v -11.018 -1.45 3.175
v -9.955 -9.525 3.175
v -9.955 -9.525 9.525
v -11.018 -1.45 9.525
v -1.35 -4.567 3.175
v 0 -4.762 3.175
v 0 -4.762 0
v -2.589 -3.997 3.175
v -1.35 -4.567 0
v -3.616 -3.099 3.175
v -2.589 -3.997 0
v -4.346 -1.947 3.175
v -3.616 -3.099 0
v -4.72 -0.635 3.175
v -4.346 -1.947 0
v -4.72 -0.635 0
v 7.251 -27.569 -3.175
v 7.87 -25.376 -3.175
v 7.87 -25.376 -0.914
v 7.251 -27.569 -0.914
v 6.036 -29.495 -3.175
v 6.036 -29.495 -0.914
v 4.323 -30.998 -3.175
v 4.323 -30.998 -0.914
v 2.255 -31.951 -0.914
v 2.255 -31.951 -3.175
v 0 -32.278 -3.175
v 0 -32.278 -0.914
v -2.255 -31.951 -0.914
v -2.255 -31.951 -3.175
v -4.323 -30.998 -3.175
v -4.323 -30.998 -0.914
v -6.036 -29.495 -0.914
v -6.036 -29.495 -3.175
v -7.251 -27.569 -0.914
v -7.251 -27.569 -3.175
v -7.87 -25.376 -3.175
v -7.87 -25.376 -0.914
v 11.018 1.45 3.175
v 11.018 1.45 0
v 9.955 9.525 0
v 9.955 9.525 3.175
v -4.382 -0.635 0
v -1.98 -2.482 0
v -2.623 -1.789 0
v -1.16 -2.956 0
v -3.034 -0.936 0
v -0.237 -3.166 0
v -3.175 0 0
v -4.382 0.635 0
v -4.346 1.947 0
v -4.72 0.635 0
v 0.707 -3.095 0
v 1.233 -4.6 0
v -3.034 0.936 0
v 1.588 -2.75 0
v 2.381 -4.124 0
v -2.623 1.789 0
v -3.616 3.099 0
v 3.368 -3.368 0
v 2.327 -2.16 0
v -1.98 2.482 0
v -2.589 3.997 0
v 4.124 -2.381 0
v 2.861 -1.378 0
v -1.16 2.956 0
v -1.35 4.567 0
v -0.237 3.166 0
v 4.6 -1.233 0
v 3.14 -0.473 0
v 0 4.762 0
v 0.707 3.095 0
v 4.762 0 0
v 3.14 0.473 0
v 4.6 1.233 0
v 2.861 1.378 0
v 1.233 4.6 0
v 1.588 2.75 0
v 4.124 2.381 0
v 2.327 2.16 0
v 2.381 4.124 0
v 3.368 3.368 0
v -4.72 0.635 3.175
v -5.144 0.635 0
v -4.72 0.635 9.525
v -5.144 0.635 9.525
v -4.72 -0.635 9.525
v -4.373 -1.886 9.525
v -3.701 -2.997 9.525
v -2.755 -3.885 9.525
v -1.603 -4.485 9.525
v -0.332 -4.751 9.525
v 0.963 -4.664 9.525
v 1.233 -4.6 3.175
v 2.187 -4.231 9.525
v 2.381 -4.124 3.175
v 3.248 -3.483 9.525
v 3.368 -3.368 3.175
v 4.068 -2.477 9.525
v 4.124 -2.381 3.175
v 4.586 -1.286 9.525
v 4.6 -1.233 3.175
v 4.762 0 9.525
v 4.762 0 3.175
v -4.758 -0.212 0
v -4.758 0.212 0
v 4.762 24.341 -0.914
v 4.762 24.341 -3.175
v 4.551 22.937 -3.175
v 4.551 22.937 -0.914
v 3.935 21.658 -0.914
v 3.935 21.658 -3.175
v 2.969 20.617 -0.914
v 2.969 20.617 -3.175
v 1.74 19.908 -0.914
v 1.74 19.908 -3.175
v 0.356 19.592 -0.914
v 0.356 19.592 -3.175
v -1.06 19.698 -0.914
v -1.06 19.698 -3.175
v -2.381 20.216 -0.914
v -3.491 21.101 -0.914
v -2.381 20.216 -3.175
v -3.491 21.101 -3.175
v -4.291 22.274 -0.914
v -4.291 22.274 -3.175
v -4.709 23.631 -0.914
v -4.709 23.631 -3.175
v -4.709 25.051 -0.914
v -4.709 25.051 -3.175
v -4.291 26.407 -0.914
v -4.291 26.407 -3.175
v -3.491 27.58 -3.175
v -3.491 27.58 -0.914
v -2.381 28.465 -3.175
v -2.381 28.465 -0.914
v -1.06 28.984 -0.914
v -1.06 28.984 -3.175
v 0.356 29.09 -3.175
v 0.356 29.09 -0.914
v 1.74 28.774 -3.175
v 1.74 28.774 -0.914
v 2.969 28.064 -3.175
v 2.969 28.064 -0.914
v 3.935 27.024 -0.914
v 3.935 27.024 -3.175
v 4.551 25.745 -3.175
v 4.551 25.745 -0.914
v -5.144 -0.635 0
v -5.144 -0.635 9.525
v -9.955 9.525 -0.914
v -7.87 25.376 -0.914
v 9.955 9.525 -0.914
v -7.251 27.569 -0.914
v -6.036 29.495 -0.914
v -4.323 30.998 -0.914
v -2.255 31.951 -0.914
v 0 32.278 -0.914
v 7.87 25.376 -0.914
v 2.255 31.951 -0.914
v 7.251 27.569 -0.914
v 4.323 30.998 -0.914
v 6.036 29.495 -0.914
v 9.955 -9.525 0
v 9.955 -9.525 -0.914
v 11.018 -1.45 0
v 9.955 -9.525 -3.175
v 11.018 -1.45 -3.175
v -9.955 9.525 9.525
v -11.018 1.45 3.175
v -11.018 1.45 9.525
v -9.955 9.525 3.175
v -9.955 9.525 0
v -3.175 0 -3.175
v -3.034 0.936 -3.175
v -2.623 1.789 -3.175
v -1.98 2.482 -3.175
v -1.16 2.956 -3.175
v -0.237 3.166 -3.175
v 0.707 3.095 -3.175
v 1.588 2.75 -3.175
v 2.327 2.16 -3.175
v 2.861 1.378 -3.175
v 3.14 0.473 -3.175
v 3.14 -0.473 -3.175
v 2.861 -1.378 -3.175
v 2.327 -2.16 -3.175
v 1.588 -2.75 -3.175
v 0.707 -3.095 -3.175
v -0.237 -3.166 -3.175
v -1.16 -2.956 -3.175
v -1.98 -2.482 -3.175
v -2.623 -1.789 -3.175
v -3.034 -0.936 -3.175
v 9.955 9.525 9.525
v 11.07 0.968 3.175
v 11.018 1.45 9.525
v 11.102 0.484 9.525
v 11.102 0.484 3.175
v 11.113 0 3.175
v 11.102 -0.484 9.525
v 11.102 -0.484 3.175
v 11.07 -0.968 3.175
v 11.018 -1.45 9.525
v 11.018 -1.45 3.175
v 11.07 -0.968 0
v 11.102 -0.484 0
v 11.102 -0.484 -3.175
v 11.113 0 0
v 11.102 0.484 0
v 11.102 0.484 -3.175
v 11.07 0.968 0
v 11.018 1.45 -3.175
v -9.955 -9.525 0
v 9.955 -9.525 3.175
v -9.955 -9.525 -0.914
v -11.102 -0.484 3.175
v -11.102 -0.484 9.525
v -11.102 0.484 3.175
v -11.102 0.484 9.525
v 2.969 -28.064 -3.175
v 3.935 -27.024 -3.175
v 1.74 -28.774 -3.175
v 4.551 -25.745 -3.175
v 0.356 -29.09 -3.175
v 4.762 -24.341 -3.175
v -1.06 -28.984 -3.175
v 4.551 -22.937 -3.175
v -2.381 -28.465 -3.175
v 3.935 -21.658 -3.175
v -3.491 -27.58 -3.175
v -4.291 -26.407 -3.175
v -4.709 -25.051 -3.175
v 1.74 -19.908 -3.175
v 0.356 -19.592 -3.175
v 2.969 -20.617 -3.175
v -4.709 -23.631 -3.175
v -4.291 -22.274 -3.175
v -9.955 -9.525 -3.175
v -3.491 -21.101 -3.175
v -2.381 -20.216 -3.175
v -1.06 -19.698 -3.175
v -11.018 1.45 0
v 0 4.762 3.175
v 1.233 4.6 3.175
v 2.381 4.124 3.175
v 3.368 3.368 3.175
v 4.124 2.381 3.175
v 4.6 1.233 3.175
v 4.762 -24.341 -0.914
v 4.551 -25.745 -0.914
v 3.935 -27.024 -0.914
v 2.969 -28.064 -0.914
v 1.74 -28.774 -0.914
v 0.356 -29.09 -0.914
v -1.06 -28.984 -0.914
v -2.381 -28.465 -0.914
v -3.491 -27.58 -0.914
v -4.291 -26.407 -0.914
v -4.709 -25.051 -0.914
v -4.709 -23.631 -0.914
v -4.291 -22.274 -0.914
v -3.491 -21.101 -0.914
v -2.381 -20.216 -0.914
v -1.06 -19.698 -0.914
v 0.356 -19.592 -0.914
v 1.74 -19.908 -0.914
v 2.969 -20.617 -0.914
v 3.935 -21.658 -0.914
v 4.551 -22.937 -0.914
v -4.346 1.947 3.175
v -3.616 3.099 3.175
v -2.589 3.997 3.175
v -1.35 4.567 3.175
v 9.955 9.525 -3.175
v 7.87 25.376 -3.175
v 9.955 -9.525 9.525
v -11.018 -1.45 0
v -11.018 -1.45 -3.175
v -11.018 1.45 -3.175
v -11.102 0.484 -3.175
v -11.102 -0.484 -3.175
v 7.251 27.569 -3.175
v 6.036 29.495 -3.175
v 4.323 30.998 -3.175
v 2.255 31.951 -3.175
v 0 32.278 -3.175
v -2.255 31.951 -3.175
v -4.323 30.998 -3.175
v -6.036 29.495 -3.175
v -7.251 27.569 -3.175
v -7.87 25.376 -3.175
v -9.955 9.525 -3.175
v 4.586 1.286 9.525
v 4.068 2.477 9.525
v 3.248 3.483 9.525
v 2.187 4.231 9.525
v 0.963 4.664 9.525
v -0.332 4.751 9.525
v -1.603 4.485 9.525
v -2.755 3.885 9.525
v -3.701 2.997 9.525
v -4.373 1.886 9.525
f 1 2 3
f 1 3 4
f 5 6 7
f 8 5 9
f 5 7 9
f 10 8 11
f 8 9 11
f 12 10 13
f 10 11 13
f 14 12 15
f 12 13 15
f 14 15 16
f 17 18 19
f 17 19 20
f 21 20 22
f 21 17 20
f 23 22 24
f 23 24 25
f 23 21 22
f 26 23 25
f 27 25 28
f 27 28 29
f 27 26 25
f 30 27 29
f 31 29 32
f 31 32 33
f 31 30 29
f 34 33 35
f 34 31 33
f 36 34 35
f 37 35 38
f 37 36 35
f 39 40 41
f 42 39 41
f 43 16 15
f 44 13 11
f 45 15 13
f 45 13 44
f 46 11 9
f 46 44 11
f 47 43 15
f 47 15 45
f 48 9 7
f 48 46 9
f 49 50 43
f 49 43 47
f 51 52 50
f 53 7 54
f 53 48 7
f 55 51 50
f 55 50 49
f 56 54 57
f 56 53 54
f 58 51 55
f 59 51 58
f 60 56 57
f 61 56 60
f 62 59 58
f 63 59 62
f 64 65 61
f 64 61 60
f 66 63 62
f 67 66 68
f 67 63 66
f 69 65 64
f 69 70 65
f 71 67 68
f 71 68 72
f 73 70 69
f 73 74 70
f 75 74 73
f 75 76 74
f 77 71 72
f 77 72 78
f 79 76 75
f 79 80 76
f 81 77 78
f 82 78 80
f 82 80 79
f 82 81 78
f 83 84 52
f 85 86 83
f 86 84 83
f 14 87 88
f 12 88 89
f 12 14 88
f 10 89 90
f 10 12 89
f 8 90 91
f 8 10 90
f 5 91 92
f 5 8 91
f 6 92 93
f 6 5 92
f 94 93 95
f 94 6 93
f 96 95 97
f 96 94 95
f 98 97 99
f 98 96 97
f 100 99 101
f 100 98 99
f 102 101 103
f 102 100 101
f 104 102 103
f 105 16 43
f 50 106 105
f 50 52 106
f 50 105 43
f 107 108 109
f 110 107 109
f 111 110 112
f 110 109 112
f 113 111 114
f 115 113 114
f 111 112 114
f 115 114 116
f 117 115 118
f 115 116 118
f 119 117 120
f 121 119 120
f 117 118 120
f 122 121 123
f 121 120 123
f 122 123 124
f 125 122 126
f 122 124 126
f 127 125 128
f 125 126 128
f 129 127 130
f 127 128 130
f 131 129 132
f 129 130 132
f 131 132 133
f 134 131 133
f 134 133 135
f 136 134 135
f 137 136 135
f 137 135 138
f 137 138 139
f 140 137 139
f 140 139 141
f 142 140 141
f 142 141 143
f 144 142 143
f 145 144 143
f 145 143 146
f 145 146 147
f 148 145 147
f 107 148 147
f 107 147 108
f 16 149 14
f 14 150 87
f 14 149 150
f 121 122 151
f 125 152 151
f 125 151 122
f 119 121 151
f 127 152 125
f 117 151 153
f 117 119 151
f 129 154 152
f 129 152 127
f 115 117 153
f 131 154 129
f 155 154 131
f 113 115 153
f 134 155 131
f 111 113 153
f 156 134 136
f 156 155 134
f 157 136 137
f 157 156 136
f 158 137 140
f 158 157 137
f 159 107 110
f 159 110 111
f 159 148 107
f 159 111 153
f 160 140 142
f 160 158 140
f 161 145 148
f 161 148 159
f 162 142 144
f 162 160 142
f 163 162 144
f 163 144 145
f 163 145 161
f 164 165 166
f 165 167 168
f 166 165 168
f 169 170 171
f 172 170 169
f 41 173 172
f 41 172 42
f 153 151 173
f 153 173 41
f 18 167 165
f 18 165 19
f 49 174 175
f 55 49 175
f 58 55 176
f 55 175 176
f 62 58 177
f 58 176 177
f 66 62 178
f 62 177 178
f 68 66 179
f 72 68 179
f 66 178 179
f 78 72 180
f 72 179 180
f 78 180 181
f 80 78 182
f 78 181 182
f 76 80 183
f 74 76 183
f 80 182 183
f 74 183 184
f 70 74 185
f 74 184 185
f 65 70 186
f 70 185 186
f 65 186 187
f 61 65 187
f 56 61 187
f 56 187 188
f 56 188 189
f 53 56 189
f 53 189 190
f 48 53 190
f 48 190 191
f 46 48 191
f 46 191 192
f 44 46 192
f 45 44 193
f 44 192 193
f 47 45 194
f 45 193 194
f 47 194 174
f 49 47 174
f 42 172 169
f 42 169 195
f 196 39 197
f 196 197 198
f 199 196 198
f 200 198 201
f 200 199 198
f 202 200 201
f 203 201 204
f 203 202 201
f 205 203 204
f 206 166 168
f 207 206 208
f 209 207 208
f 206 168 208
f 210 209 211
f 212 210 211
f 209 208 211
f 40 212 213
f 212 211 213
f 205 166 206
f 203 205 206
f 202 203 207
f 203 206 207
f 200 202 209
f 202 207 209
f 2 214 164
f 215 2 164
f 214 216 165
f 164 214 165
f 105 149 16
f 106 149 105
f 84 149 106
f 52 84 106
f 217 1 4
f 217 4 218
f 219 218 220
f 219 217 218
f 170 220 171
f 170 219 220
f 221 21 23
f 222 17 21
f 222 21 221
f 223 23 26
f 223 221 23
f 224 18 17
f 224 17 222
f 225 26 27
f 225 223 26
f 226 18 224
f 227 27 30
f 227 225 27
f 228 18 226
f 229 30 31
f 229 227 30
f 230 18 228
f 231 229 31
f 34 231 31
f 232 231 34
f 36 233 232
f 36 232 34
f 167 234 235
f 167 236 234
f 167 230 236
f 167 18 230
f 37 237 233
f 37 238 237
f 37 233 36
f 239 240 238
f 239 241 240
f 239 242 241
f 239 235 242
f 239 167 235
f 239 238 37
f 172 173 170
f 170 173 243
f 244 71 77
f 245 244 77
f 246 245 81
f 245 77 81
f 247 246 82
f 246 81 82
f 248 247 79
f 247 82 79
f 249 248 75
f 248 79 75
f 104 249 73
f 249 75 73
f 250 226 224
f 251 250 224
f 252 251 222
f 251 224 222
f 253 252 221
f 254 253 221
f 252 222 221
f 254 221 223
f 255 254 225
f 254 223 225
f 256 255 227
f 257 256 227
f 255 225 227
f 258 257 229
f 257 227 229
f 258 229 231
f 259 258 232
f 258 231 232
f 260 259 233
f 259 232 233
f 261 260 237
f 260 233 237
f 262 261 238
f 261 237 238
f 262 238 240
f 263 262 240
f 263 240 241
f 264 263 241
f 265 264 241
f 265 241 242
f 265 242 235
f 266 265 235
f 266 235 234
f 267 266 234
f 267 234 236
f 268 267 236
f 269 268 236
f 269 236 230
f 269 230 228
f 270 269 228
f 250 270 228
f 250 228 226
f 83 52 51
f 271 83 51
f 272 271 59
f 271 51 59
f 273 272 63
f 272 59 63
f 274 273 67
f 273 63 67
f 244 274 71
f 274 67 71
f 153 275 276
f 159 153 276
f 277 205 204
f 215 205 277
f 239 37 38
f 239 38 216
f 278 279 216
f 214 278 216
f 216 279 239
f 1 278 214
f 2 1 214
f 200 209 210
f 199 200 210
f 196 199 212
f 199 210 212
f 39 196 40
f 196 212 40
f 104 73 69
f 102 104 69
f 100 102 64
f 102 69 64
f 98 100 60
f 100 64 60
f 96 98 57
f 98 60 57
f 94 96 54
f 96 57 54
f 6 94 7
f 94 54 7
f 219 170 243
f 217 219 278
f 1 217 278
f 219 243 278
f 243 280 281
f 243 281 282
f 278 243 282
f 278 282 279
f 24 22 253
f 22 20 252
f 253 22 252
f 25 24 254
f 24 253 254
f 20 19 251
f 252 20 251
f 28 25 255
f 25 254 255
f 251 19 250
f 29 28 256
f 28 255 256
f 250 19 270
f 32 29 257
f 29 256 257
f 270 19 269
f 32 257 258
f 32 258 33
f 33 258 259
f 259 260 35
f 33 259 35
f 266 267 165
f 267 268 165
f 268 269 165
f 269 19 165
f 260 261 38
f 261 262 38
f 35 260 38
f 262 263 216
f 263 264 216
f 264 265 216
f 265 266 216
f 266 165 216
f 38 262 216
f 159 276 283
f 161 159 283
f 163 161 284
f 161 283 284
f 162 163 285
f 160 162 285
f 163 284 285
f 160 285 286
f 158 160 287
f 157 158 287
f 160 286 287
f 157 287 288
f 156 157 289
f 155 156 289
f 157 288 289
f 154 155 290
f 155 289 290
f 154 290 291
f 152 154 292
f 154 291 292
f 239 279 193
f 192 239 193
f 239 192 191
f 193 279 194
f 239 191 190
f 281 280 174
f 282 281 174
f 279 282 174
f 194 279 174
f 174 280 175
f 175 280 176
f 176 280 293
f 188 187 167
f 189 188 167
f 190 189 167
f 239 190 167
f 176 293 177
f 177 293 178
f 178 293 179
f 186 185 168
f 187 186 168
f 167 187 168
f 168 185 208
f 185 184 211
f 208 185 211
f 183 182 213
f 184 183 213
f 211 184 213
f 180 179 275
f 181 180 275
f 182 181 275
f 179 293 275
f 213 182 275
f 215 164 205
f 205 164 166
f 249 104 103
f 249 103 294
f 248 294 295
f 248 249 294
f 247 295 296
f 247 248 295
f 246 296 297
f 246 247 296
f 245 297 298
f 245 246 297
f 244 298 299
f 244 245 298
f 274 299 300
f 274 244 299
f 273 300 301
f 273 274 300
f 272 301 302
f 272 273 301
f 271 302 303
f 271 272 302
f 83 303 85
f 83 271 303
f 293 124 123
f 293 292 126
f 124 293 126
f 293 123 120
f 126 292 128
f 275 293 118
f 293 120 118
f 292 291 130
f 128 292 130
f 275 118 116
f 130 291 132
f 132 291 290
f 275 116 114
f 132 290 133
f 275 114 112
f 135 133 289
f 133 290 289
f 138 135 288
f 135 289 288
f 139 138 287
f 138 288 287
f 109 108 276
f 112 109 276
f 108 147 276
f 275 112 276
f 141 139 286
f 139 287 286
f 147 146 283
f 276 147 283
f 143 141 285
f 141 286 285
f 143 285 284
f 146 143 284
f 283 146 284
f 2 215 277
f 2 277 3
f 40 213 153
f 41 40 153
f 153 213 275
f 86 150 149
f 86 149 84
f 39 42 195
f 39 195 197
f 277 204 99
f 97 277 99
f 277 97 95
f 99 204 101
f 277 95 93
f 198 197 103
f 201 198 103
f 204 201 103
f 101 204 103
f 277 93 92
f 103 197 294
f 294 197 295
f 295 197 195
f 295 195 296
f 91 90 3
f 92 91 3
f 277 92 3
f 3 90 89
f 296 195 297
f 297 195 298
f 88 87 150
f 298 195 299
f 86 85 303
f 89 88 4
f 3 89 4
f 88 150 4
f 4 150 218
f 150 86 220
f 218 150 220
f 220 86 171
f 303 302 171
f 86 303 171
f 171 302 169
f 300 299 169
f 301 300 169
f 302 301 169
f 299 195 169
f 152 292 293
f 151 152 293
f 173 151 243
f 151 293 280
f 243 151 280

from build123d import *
from build123d.topology import SkipClean

# Parameters (mm, degrees)
BOSS_EXTRUDE1_DEPTH = 3.175
BOSS_EXTRUDE2_START = 3.175
SKETCH2_R           = 3.175
BOSS_EXTRUDE2_DEPTH = 3.175
SKETCH3_R           = 4.7625
BOSS_EXTRUDE3_DEPTH = 6.35
BOSS_EXTRUDE4_START = 3.175
SKETCH4_R           = 4.7625
BOSS_EXTRUDE4_DEPTH = 3.175
CUT_EXTRUDE1_START  = -4.0894
CUT_EXTRUDE1_DEPTH  = 4.0894
SKETCH6_W           = 0.762
SKETCH6_H           = 1.27
CUT_EXTRUDE2_DEPTH  = 9.525


with BuildPart() as part:
    # Sketch1 → Boss-Extrude1 (new body)
    with BuildSketch(Plane.XY):
        with BuildLine():
            Line((11.017558073, 1.449506939), (7.869684338, 25.3761821))
            ThreePointArc((7.869684338, 25.3761821), (7.920527939, 24.859610334), (7.9375, 24.34082))
            ThreePointArc((7.9375, 24.34082), (5.612660076, 18.728159924), (0, 16.40332))
            Line((0, 16.40332), (0, 11.1125))
            ThreePointArc((0, 11.1125), (7.327346395, 8.354498851), (11.017558073, 1.449506939))
        make_face()
        with BuildLine():
            ThreePointArc((7.9375, 24.34082), (7.920527939, 24.859610334), (7.869684338, 25.3761821))
            ThreePointArc((7.869684338, 25.3761821), (5.233818854, 30.30831918), (0, 32.27832))
            Line((0, 32.27832), (0, 29.10332))
            ThreePointArc((0, 29.10332), (3.367596045, 27.708416045), (4.7625, 24.34082))
            ThreePointArc((4.7625, 24.34082), (3.367596045, 20.973223955), (0, 19.57832))
            Line((0, 19.57832), (0, 16.40332))
            ThreePointArc((0, 16.40332), (5.612660076, 18.728159924), (7.9375, 24.34082))
        make_face()
        with BuildLine():
            Line((0, 29.10332), (0, 32.27832))
            ThreePointArc((0, 32.27832), (-5.233818854, 30.30831918), (-7.869684338, 25.3761821))
            ThreePointArc((-7.869684338, 25.3761821), (-5.96749918, 19.107001146), (0, 16.40332))
            Line((0, 16.40332), (0, 19.57832))
            ThreePointArc((0, 19.57832), (-4.7625, 24.34082), (0, 29.10332))
        make_face()
        with BuildLine():
            ThreePointArc((-11.017558073, 1.449506939), (-7.327346395, 8.354498851), (0, 11.1125))
            Line((0, 11.1125), (0, 16.40332))
            ThreePointArc((0, 16.40332), (-5.96749918, 19.107001146), (-7.869684338, 25.3761821))
            Line((-7.869684338, 25.3761821), (-11.017558073, 1.449506939))
        make_face()
        with BuildLine():
            ThreePointArc((11.1125, 0), (11.088739115, 0.726306467), (11.017558073, 1.449506939))
            ThreePointArc((11.017558073, 1.449506939), (7.327346395, 8.354498851), (0, 11.1125))
            Line((0, 11.1125), (0, 4.7625))
            ThreePointArc((0, 4.7625), (3.367596045, 3.367596045), (4.7625, 0))
            ThreePointArc((4.7625, 0), (3.367596045, -3.367596045), (0, -4.7625))
            Line((0, -4.7625), (0, -11.1125))
            ThreePointArc((0, -11.1125), (7.327346395, -8.354498851), (11.017558073, -1.449506939))
            ThreePointArc((11.017558073, -1.449506939), (11.088739115, -0.726306467), (11.1125, 0))
        make_face()
        with BuildLine():
            Line((0, 4.7625), (0, 11.1125))
            ThreePointArc((0, 11.1125), (-7.327346395, 8.354498851), (-11.017558073, 1.449506939))
            ThreePointArc((-11.017558073, 1.449506939), (-11.1125, 0), (-11.017558073, -1.449506939))
            ThreePointArc((-11.017558073, -1.449506939), (-7.327346395, -8.354498851), (0, -11.1125))
            Line((0, -11.1125), (0, -4.7625))
            ThreePointArc((0, -4.7625), (-4.7625, 0), (0, 4.7625))
        make_face()
        with BuildLine():
            Line((7.869684338, -25.3761821), (11.017558073, -1.449506939))
            ThreePointArc((11.017558073, -1.449506939), (7.327346395, -8.354498851), (0, -11.1125))
            Line((0, -11.1125), (0, -16.40332))
            ThreePointArc((0, -16.40332), (5.612660076, -18.728159924), (7.9375, -24.34082))
            ThreePointArc((7.9375, -24.34082), (7.920527939, -24.859610334), (7.869684338, -25.3761821))
        make_face()
        with BuildLine():
            Line((0, -16.40332), (0, -11.1125))
            ThreePointArc((0, -11.1125), (-7.327346395, -8.354498851), (-11.017558073, -1.449506939))
            Line((-11.017558073, -1.449506939), (-7.869684338, -25.3761821))
            ThreePointArc((-7.869684338, -25.3761821), (-5.96749918, -19.107001146), (0, -16.40332))
        make_face()
        with BuildLine():
            ThreePointArc((0, -32.27832), (5.233818854, -30.30831918), (7.869684338, -25.3761821))
            ThreePointArc((7.869684338, -25.3761821), (7.920527939, -24.859610334), (7.9375, -24.34082))
            ThreePointArc((7.9375, -24.34082), (5.612660076, -18.728159924), (0, -16.40332))
            Line((0, -16.40332), (0, -19.57832))
            ThreePointArc((0, -19.57832), (3.367596045, -20.973223955), (4.7625, -24.34082))
            ThreePointArc((4.7625, -24.34082), (3.367596045, -27.708416045), (0, -29.10332))
            Line((0, -29.10332), (0, -32.27832))
        make_face()
        with BuildLine():
            ThreePointArc((-7.869684338, -25.3761821), (-5.233818854, -30.30831918), (0, -32.27832))
            Line((0, -32.27832), (0, -29.10332))
            ThreePointArc((0, -29.10332), (-4.7625, -24.34082), (0, -19.57832))
            Line((0, -19.57832), (0, -16.40332))
            ThreePointArc((0, -16.40332), (-5.96749918, -19.107001146), (-7.869684338, -25.3761821))
        make_face()
    extrude(amount=BOSS_EXTRUDE1_DEPTH)

    # Sketch2 → Boss-Extrude2 (add)
    with BuildSketch(Plane(origin=(0, 0, 0), x_dir=(-1, 0, 0), z_dir=(0, 0, -1)).offset(BOSS_EXTRUDE2_START)):
        with BuildLine():
            Line((-9.955119086, 9.525), (9.955119086, 9.525))
            Line((9.955119086, 9.525), (11.017558073, 1.449506939))
            ThreePointArc((11.017558073, 1.449506939), (11.1125, 0), (11.017558073, -1.449506939))
            Line((11.017558073, -1.449506939), (9.955119086, -9.525))
            Line((9.955119086, -9.525), (-9.955119086, -9.525))
            Line((-9.955119086, -9.525), (-11.017558073, -1.449506939))
            ThreePointArc((-11.017558073, -1.449506939), (-11.1125, 0), (-11.017558073, 1.449506939))
            Line((-11.017558073, 1.449506939), (-9.955119086, 9.525))
        make_face()
        Circle(SKETCH2_R, mode=Mode.SUBTRACT)
    extrude(amount=-BOSS_EXTRUDE2_DEPTH)

    # Sketch3 → Boss-Extrude3 (add)
    with SkipClean():  # the faces are left unmerged after this step: merging them gives an invalid solid
        with BuildSketch(Plane.XY.offset(3.175)):
            with BuildLine():
                Line((-9.955119086, 9.525), (9.955119086, 9.525))
                Line((9.955119086, 9.525), (11.017558073, 1.449506939))
                ThreePointArc((11.017558073, 1.449506939), (11.1125, 0), (11.017558073, -1.449506939))
                Line((11.017558073, -1.449506939), (9.955119086, -9.525))
                Line((9.955119086, -9.525), (-9.955119086, -9.525))
                Line((-9.955119086, -9.525), (-11.017558073, -1.449506939))
                ThreePointArc((-11.017558073, -1.449506939), (-11.1125, 0), (-11.017558073, 1.449506939))
                Line((-11.017558073, 1.449506939), (-9.955119086, 9.525))
            make_face()
            Circle(SKETCH3_R, mode=Mode.SUBTRACT)
        extrude(amount=BOSS_EXTRUDE3_DEPTH)

    # Sketch4 → Boss-Extrude4 (add)
    # profile 1 of 2: a face of its own
    with SkipClean():  # the faces are left unmerged after this step: merging them gives an invalid solid
        with BuildSketch(Plane(origin=(0, 0, 0), x_dir=(-1, 0, 0), z_dir=(0, 0, -1)).offset(BOSS_EXTRUDE4_START)):
            with BuildLine():
                Line((9.955119086, 9.525), (-9.955119086, 9.525))
                Line((-9.955119086, 9.525), (-7.869684338, 25.3761821))
                ThreePointArc((-7.869684338, 25.3761821), (0, 32.27832), (7.869684338, 25.3761821))
                Line((7.869684338, 25.3761821), (9.955119086, 9.525))
            make_face()
            with Locations(Location((0, 24.34082, 0), (0, 0, 180))):
                Circle(SKETCH4_R, mode=Mode.SUBTRACT)
        # profile 2 of 2: a face of its own
        with BuildSketch(Plane(origin=(0, 0, 0), x_dir=(-1, 0, 0), z_dir=(0, 0, -1)).offset(BOSS_EXTRUDE4_START)):
            with BuildLine():
                Line((-9.955119086, -9.525), (-7.869684338, -25.3761821))
                ThreePointArc((-7.869684338, -25.3761821), (0, -32.27832), (7.869684338, -25.3761821))
                Line((7.869684338, -25.3761821), (9.955119086, -9.525))
                Line((9.955119086, -9.525), (-9.955119086, -9.525))
            make_face()
            with Locations(Location((0, -24.34082, 0), (0, 0, 180))):
                Circle(SKETCH4_R, mode=Mode.SUBTRACT)
        extrude(amount=-BOSS_EXTRUDE4_DEPTH)

    # Sketch5 → Cut-Extrude1 (cut)
    with SkipClean():  # the faces are left unmerged after this step: merging them gives an invalid solid
        with BuildSketch(Plane.XY.offset(3.175).offset(CUT_EXTRUDE1_START)):
            with BuildLine():
                Line((-7.869684338, -25.3761821), (-9.955119086, -9.525))
                Line((-9.955119086, -9.525), (9.955119086, -9.525))
                Line((9.955119086, -9.525), (7.869684338, -25.3761821))
                ThreePointArc((7.869684338, -25.3761821), (0, -32.27832), (-7.869684338, -25.3761821))
            make_face()
            with BuildLine():
                Line((-7.869684338, 25.3761821), (-9.955119086, 9.525))
                Line((-9.955119086, 9.525), (9.955119086, 9.525))
                Line((9.955119086, 9.525), (7.869684338, 25.3761821))
                ThreePointArc((7.869684338, 25.3761821), (0, 32.27832), (-7.869684338, 25.3761821))
            make_face()
        extrude(amount=CUT_EXTRUDE1_DEPTH, mode=Mode.SUBTRACT)

    # Sketch6 → Cut-Extrude2 (cut)
    with SkipClean():  # the faces are left unmerged after this step: merging them gives an invalid solid
        with BuildSketch(Plane.XY.offset(9.525)):
            with Locations((-4.7625, 0)):
                Rectangle(SKETCH6_W, SKETCH6_H)
        extrude(amount=-CUT_EXTRUDE2_DEPTH, mode=Mode.SUBTRACT)


solid = part.part
